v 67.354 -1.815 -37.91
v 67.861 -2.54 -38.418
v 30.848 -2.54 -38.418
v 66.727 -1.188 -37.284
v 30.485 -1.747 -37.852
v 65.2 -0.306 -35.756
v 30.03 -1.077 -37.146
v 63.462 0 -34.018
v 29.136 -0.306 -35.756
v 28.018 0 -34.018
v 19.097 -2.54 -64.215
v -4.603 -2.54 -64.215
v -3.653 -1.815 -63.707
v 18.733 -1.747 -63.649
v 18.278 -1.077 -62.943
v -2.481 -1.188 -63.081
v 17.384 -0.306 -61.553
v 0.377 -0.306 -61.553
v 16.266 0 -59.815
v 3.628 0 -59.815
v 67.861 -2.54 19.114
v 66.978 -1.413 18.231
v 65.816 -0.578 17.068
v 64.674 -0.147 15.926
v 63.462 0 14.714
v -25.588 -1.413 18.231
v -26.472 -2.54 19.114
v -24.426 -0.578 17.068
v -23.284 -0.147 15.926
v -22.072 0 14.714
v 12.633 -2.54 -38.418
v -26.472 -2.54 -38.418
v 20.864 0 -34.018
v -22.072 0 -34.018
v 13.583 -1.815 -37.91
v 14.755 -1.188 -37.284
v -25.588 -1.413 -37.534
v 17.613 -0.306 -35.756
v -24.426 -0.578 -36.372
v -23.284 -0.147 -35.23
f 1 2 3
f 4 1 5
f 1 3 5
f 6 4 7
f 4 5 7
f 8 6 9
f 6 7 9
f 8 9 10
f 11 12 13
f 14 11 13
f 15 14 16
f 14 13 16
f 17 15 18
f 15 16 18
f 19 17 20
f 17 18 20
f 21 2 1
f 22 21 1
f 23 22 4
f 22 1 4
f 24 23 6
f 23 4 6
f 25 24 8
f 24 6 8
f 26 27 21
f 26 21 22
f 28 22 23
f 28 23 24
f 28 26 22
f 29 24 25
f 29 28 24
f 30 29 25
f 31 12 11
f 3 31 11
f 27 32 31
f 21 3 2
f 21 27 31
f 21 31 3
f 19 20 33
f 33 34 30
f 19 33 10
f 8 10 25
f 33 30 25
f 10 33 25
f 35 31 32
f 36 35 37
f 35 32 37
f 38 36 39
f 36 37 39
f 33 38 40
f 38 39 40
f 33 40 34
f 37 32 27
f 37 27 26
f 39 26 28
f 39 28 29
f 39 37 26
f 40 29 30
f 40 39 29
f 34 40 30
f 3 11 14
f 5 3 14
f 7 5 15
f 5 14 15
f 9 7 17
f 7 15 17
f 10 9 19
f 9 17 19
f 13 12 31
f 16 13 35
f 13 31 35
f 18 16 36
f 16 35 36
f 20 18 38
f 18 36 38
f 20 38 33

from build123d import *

# Parameters (mm, degrees)
F1_DEPTH     = 2.54
F2_T1_DEPTH  = 116.3302767053
F2_T3_DEPTH  = 79.5286740138
F2_T5_DEPTH  = 45.6964583098
F2_T10_DEPTH = 61.1019260212
F2_T15_DEPTH = 53.0222754018
F2_T20_DEPTH = 50.3447363809
F2_T25_DEPTH = 59.0101457163
F2_T31_DEPTH = 50.1034033931
F2_T35_DEPTH = 53.0222754018
F2_T42_DEPTH = 50.3447363809
F2_T46_DEPTH = 48.0116230882


# Not quite as in the source:
# - a fillet or chamfer that OpenCascade refuses, or shapes differently, is made with other operations: its cross-section is extruded or revolved along the edge and cut away or added


with BuildPart() as f1:
    # F0 (on Front) → F1 (new body)
    with BuildSketch(Plane.XZ):
        Polygon((67.8614974022, 19.1138908267), (-26.4717340469, 19.1138908267), (-26.4717340469, -38.417737931), (12.6331467181, -38.417737931), (30.848396942, -38.417737931), (67.8614974022, -38.417737931), align=None)
        Polygon((30.848396942, -38.417737931), (12.6331467181, -38.417737931), (-4.6027889475, -64.2147809267), (19.0966241062, -64.2147809267), align=None)
    extrude(amount=F1_DEPTH)

    # F2: fillet of radius 5.08 on 8 edges, made by hand

    # F2_s2 → F2_t1 (cut)
    with BuildSketch(Plane.YZ.offset(-37.470256675)):
        with BuildLine():
            ThreePointArc((-2.54, 19.1138908267), (-0.6805909488, 17.2544817755), (0, 14.7144817755))
            Line((0, 14.7144817755), (0, 19.1138908267))
            Line((0, 19.1138908267), (-2.54, 19.1138908267))
        make_face()
    extrude(amount=F2_T1_DEPTH, mode=Mode.SUBTRACT)

    # F2_s4 → F2_t3 (cut)
    with BuildSketch(Plane.XY.offset(-49.4162605591)):
        with BuildLine():
            ThreePointArc((-26.4717340469, -2.54), (-24.6123249957, -0.6805909488), (-22.0723249957, 0))
            Line((-22.0723249957, 0), (-26.4717340469, 0))
            Line((-26.4717340469, 0), (-26.4717340469, -2.54))
        make_face()
        with BuildLine():
            ThreePointArc((67.8614974022, -2.54), (66.002088351, -0.6805909488), (63.462088351, 0))
            Line((63.462088351, 0), (67.8614974022, 0))
            Line((67.8614974022, 0), (67.8614974022, -2.54))
        make_face()
    extrude(amount=F2_T3_DEPTH, mode=Mode.SUBTRACT)

    # F2_s6 → F2_t5 (cut)
    with BuildSketch(Plane.YZ.offset(-15.6013115756)):
        with BuildLine():
            ThreePointArc((-2.54, -64.2147809267), (-0.6805909488, -62.3553718755), (0, -59.8153718755))
            Line((0, -59.8153718755), (0, -64.2147809267))
            Line((0, -64.2147809267), (-2.54, -64.2147809267))
        make_face()
    extrude(amount=F2_T5_DEPTH, mode=Mode.SUBTRACT)


with BuildPart() as f2_tool8:
    # F2_s9 → F2_t10 (new body)
    with BuildSketch(Plane.YZ.offset(-37.470256675)):
        with BuildLine():
            ThreePointArc((-2.54, -38.417737931), (-0.6805909488, -36.5583288798), (0, -34.0183288798))
            Line((0, -34.0183288798), (0, -38.417737931))
            Line((0, -38.417737931), (-2.54, -38.417737931))
        make_face()
    extrude(amount=F2_T10_DEPTH)

    split(bisect_by=Plane(origin=(26.480413057, 0, -17.6925198724), x_dir=(0, 1, 0), z_dir=(-0.8314859511, 0, 0.5555457795)), keep=Keep.TOP)


with BuildPart() as f1_1:
    add(f1.part)

    # F2_t7: cut F2_tool8
    add(f2_tool8.part, mode=Mode.SUBTRACT)


with BuildPart() as f2_tool13:
    # F2_s14 → F2_t15 (new body)
    with BuildSketch(Plane(origin=(-7.737083512, 0, -11.5801010106), x_dir=(0, 1, 0), z_dir=(-0.5555457795, 0, -0.8314859511))):
        with BuildLine():
            ThreePointArc((-2.54, 31.8470961801), (-0.6805909488, 33.7065052313), (0, 36.2465052313))
            Line((0, 36.2465052313), (0, 31.8470961801))
            Line((0, 31.8470961801), (-2.54, 31.8470961801))
        make_face()
    extrude(amount=F2_T15_DEPTH)

    split(bisect_by=Plane.XY.offset(-38.417737931), keep=Keep.BOTTOM)


with BuildPart() as f1_2:
    add(f1_1.part)

    # F2_t12: cut F2_tool13
    add(f2_tool13.part, mode=Mode.SUBTRACT)


with BuildPart() as f2_tool18:
    # F2_s19 → F2_t20 (new body)
    with BuildSketch(Plane(origin=(-25.5031201264, 0, -55.983475482), x_dir=(0, 1, 0), z_dir=(0.4145583774, 0, 0.9100227204))):
        with BuildLine():
            ThreePointArc((-2.54, -43.9991372067), (-0.6805909488, -42.1397281555), (0, -39.5997281555))
            Line((0, -39.5997281555), (0, -43.9991372067))
            Line((0, -43.9991372067), (-2.54, -43.9991372067))
        make_face()
    extrude(amount=F2_T20_DEPTH)

    split(bisect_by=Plane.XY.offset(-38.417737931), keep=Keep.BOTTOM)


with BuildPart() as f1_3:
    add(f1_2.part)

    # F2_t17: cut F2_tool18
    add(f2_tool18.part, mode=Mode.SUBTRACT)


with BuildPart() as f2_tool23:
    # F2_s24 → F2_t25 (new body)
    with BuildSketch(Plane.YZ.offset(19.849874314)):
        with BuildLine():
            ThreePointArc((-2.54, -38.417737931), (-0.6805909488, -36.5583288798), (0, -34.0183288798))
            Line((0, -34.0183288798), (0, -38.417737931))
            Line((0, -38.417737931), (-2.54, -38.417737931))
        make_face()
    extrude(amount=F2_T25_DEPTH)

    split(bisect_by=Plane(origin=(40.040214538, 0, -18.2402109276), x_dir=(0, 1, 0), z_dir=(0.9100227204, 0, -0.4145583774)), keep=Keep.TOP)


with BuildPart() as f1_4:
    add(f1_3.part)

    # F2_t22: cut F2_tool23
    add(f2_tool23.part, mode=Mode.SUBTRACT)


with BuildPart() as f2_tool29:
    # F2_s30 → F2_t31 (new body)
    with BuildSketch(Plane.YZ.offset(-26.4717340469)):
        with BuildLine():
            ThreePointArc((-2.54, -38.417737931), (-0.6805909488, -36.5583288798), (0, -34.0183288798))
            Line((0, -34.0183288798), (0, -38.417737931))
            Line((0, -38.417737931), (-2.54, -38.417737931))
        make_face()
    extrude(amount=F2_T31_DEPTH)

    split(bisect_by=Plane(origin=(26.480413057, 0, -17.6925198724), x_dir=(0, 1, 0), z_dir=(0.8314859511, 0, -0.5555457795)), keep=Keep.TOP)


with BuildPart() as f2_tool33:
    # F2_s34 → F2_t35 (new body)
    with BuildSketch(Plane(origin=(-7.737083512, 0, -11.5801010106), x_dir=(0, 1, 0), z_dir=(-0.5555457795, 0, -0.8314859511))):
        with BuildLine():
            ThreePointArc((-2.54, 31.8470961801), (-0.6805909488, 33.7065052313), (0, 36.2465052313))
            Line((0, 36.2465052313), (0, 31.8470961801))
            Line((0, 31.8470961801), (-2.54, 31.8470961801))
        make_face()
    extrude(amount=F2_T35_DEPTH)

    split(bisect_by=Plane.XY.offset(-38.417737931), keep=Keep.TOP)


with BuildPart() as f2_tool29_1:
    add(f2_tool29.part)

    # F2_t37: intersect F2_tool33
    add(f2_tool33.part, mode=Mode.INTERSECT)


with BuildPart() as f1_5:
    add(f1_4.part)

    # F2_t27: cut F2_tool29
    add(f2_tool29_1.part, mode=Mode.SUBTRACT)


with BuildPart() as f2_tool40:
    # F2_s41 → F2_t42 (new body)
    with BuildSketch(Plane(origin=(-25.5031201264, 0, -55.983475482), x_dir=(0, 1, 0), z_dir=(0.4145583774, 0, 0.9100227204))):
        with BuildLine():
            ThreePointArc((-2.54, -43.9991372067), (-0.6805909488, -42.1397281555), (0, -39.5997281555))
            Line((0, -39.5997281555), (0, -43.9991372067))
            Line((0, -43.9991372067), (-2.54, -43.9991372067))
        make_face()
    extrude(amount=F2_T42_DEPTH)

    split(bisect_by=Plane.XY.offset(-38.417737931), keep=Keep.TOP)


with BuildPart() as f2_tool44:
    # F2_s45 → F2_t46 (new body)
    with BuildSketch(Plane.YZ.offset(19.849874314)):
        with BuildLine():
            ThreePointArc((-2.54, -38.417737931), (-0.6805909488, -36.5583288798), (0, -34.0183288798))
            Line((0, -34.0183288798), (0, -38.417737931))
            Line((0, -38.417737931), (-2.54, -38.417737931))
        make_face()
    extrude(amount=F2_T46_DEPTH)

    split(bisect_by=Plane(origin=(40.040214538, 0, -18.2402109276), x_dir=(0, 1, 0), z_dir=(-0.9100227204, 0, 0.4145583774)), keep=Keep.TOP)


with BuildPart() as f2_tool40_1:
    add(f2_tool40.part)

    # F2_t48: intersect F2_tool44
    add(f2_tool44.part, mode=Mode.INTERSECT)


with BuildPart() as f1_6:
    add(f1_5.part)

    # F2_t38: cut F2_tool40
    add(f2_tool40_1.part, mode=Mode.SUBTRACT)


solid = f1_6.part
